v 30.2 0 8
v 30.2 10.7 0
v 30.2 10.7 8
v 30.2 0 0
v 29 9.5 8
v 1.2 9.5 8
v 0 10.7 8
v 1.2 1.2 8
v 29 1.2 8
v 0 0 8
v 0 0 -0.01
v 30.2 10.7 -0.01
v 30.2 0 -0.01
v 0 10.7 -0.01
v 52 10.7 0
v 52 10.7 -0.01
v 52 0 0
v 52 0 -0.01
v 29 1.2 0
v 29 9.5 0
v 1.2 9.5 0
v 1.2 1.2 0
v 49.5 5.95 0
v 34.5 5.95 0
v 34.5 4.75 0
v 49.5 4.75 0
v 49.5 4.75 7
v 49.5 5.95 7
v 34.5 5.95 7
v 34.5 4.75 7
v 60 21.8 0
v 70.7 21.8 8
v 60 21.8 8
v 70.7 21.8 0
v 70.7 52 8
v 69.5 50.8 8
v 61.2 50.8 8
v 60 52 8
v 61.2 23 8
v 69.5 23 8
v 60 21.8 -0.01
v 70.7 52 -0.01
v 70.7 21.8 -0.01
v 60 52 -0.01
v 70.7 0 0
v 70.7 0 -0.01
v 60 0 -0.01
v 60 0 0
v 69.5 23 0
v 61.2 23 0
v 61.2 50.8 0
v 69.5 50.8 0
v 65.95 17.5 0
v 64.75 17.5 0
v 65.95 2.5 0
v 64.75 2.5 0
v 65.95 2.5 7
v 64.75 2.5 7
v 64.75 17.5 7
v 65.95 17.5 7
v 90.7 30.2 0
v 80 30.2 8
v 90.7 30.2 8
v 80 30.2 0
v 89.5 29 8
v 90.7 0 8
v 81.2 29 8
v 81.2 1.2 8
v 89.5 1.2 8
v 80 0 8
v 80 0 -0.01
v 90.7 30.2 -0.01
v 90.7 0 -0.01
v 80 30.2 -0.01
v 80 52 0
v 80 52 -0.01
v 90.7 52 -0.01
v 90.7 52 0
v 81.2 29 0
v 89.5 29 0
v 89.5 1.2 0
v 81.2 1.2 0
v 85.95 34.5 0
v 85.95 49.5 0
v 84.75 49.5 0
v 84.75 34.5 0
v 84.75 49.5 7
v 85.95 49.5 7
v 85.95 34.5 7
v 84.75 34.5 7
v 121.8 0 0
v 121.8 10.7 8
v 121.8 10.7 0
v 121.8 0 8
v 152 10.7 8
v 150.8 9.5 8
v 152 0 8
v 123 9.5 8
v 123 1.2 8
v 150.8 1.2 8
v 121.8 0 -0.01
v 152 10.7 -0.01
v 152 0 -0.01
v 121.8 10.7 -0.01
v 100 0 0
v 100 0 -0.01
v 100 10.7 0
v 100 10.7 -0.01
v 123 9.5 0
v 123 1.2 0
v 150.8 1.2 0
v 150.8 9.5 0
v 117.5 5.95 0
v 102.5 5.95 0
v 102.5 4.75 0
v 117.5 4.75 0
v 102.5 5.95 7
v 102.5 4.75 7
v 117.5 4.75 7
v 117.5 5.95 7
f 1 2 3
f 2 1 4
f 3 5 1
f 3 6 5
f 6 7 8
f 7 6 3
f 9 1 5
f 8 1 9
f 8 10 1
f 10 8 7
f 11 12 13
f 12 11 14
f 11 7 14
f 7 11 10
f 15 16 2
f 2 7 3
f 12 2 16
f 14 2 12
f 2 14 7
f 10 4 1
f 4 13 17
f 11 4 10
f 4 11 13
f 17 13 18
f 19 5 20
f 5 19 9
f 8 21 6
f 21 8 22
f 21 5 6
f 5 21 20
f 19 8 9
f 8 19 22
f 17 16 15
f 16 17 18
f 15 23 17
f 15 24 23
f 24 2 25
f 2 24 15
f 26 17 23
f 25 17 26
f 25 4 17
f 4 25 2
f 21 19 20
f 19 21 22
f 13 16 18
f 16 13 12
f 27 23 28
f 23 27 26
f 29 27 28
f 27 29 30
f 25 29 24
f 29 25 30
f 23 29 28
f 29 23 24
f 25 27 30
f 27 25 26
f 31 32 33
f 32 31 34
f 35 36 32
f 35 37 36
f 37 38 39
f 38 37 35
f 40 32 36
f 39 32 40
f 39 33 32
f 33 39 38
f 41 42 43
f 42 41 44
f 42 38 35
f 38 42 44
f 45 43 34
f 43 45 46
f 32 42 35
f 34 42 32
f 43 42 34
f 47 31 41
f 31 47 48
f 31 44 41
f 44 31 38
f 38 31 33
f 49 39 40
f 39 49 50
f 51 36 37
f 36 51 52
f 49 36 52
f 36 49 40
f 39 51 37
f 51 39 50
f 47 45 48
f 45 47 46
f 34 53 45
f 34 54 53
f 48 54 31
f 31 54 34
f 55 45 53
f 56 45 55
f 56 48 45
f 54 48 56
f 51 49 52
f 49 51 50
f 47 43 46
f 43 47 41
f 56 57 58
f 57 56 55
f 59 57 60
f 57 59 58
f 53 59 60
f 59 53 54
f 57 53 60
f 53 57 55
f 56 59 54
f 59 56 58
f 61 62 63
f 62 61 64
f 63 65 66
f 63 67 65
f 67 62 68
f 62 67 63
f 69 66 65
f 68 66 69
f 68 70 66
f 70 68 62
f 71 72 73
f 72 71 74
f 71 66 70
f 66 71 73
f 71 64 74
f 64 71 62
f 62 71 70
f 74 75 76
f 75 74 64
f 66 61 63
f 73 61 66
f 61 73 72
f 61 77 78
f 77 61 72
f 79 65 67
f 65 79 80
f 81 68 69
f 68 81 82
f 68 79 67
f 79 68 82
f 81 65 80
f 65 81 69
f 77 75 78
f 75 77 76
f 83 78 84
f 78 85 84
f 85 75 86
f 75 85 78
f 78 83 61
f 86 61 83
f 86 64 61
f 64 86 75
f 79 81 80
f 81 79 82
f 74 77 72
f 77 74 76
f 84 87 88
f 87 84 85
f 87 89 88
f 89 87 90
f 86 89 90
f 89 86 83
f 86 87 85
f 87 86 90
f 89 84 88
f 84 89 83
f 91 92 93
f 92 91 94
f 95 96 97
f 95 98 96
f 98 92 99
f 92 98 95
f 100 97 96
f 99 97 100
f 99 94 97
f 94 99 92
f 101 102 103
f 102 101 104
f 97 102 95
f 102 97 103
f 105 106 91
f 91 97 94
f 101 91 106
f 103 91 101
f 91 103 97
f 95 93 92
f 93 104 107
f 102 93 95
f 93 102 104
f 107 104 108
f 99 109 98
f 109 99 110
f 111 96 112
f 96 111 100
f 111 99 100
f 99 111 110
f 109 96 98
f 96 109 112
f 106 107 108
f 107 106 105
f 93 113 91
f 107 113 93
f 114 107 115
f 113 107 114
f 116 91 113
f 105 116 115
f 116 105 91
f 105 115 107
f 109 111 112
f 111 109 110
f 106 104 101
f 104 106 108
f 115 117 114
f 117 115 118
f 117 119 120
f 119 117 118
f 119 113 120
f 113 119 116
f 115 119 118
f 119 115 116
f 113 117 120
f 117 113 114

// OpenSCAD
// file: ../../Base/Boxes.scad
// Fischertechnik Box Foundation
// Pre-designed Boxes

use <Constants.scad>

include <PlacementOptions.scad>

box190Width = 190;
box190Depth = 130;
box130Width = 130;
box130Depth = 95;
boxUsageHeight = 33.9;
boxWallThickness = 2.4;
boxBaseThickness = 1.0;
boxWebWidth = 3.0;

// getBoxWallThickness()
// Gets the wall thickness of a Fischertechnik Box

function getBoxWallThickness() = boxWallThickness;

// Gets the usable height of a fischertechnik box
function getBoxUsageHeight() = boxUsageHeight;

// Gets the thickness of the Fischertechnik box base.
function getBoxBaseThickness() = boxBaseThickness;

// Gets the width of a box web
function getBoxWebWidth() = boxWebWidth;

// Gets the usable inner space of a Box 190 as an x/y-list
function getBox190Space() = [
    box190Width - 2*getBoxWallThickness(), 
    box190Depth - 2*getBoxWallThickness() ];

// Imports the Fischertechnik empty box 130x190 mm and places it at position 0,0
// 190x130 are the outer sizes, the inner space is slightly smaller. Use getBox190Space() to get the inner sizes.
// This module needs the STL file "Fischertechnik Box 130x190.stl" in the library path.
// The box is positioned that the usable inner space is at the 0,0,0 position. The

module Box190() {
    translate([-getBoxWallThickness(),-getBoxWallThickness(),-getBoxBaseThickness()])
        import("Fischertechnik Box 130x190.stl", convexity=3);
}

// Gets the usable inner space of a Box 130 as an x/y-list
function getBox130Space() = [
    box130Width - 2*getBoxWallThickness(), 
    box130Depth - 2*getBoxWallThickness() ];

// Imports the Fischertechnik empty box 95x130 mm and places it at position 0,0
// 190x130 are the outer sizes, the inner space is slightly smaller. Use getBox190Space() to get the inner sizes.
// This module needs the STL file "Fischertechnik Box 95x130.stl" in the library path.
// The box is positioned that the usable inner space is at the 0,0,0 position. The

module Box130() {
    translate([-getBoxWallThickness(),-getBoxWallThickness(),-getBoxBaseThickness()])
        import("Fischertechnik Box 95x130.stl", convexity=3);
}

// Creates a web at the specified box walls
// corner 0 = LowerLeft, 1 = UpperLeft, 2 = UpperRight, 3 = LowerRight
// side 0 = LeftOfCorner, 1 = RightOfCorner
// distance = Distance in mm from the corner
// box = inner width and depth of the box (default: Box 190)
// webWidth = length of the web (default is 3 mms)
// webThickness = thickness of the web (default is 1 mm)

module BoxWeb(corner, side, distance, box=getBox190Space(), webWidth=getBoxWebWidth(), webThickness=1.0) {
    sink = getBoxWallThickness()/2;

    width = (corner % 2 == 0) ? 
            (side == LeftOfCorner ? webWidth : webThickness) :
            (side == LeftOfCorner ? webThickness : webWidth);

    depth = (corner % 2 == 0) ? 
            (side == RightOfCorner ? webWidth : webThickness) :
            (side == RightOfCorner ? webThickness : webWidth);
    
    xDiff = corner == LowerLeft ? 
                (side == LeftOfCorner ? -sink : distance) :
            (corner == UpperLeft ?                
                (side == LeftOfCorner ? distance : -sink) :
            (corner == UpperRight ?
                (side == LeftOfCorner ? box.x-webWidth+sink : box.x-distance-webThickness) :
                (side == LeftOfCorner ? box.x-distance-webThickness: box.x-webWidth+sink)));

    yDiff = corner == LowerLeft ? 
                (side == RightOfCorner ? -sink : distance) :
            (corner == UpperLeft ?
                (side == RightOfCorner ? box.y-distance : box.y-webWidth+sink) :
            (corner == UpperRight ?
                (side == RightOfCorner ? box.y-webWidth+sink : box.y-distance) :
                (side == RightOfCorner ? distance : -sink)));
    
    translate([xDiff, yDiff, -getExcess()])
        cube([width, depth, boxUsageHeight + 2*getExcess()]);
}
// file: ../../Base/Rotation.scad
// Fischertechnik Box Foundation
// Geometry Helpers Rotation

include <PlacementOptions.scad>

// getRotatedSpace(space, rotation=NoRotation)
// Rotates the space dependent on the specified rotation

function getRotatedSpace(space, rotation=NoRotation) = [
    (rotation == Rotate90 || rotation == Rotate270) ? space.y : space.x,
    (rotation == Rotate90 || rotation == Rotate270) ? space.x : space.y
];

// Rotates the given space around the fixed left lower corner
// space = the space the children needs as width/depth list [width,depth]
// rotation = 0 Rotate0 degrees, 1 Rotate90 degrees, 2 Rotate180 degrees, 3 Rotate270 degrees (equivalent to -90)

module RotateFix(space, rotation=NoRotation) {
    dy = (rotation == Rotate0 || rotation == Rotate270) ? 0 :
        (rotation == Rotate90) ? space.x :
        space.y;
    dx = (rotation < Rotate180) ? 0 :
        (rotation == Rotate180) ? space.x :
        space.y;
    
    translate([dx, dy, 0])
        rotate([0, 0, rotations[rotation]])
            children();
}
// file: ../../Base/Alignment.scad
// Fischertechnik Box Foundation
// Geometry Helpers Alignment

include <PlacementOptions.scad>

// getAlignedX(elementWidth, spaceWidth, align=AlignRight, offset=0)
// Gets the aligned X offset of an element with the given
// width in the given space.
// elementWidth = The width of the element to positon
// spaceWidth = The space where the element should be aligned
// align = 0 AlignLeft, 1 AlignCenter, 2 AlignRight
// offset = an optional offset from the aligned position. When
// aligned left or centered, then positive values are in X direction.
// When aligned right then positive values are in negative X direction.

function getAlignedX(elementWidth, spaceWidth, align=AlignRight, offset=0) =
    (align == AlignLeft) ?
        offset :
        ((align == AlignCenter) ?
        (spaceWidth - elementWidth)/2 + offset :
        spaceWidth - offset - elementWidth);

// getAlignedY(elementDepth, spaceDepth, align=AlignTop, offset=0)
// Gets the aligned Y offset of an element with the given
// depth in the given space.
// elementDepth = The depth of the element to positon
// spaceDepth = The space where the element should be aligned
// align = 0 AlignBottom, 1 AlignCenter, 2 AlignTop
// offset = an optional offset from the aligned position. When
// aligned bottom or centered, then positive values are in Y direction.
// When aligned top then positive values are in negative Y direction.

function getAlignedY(elementDepth, spaceDepth, align=AlignTop, offset=0) =
    (align == AlignBottom) ?
        offset :
        ((align == AlignCenter) ?
        (spaceDepth - elementDepth)/2 + offset :
        spaceDepth - offset - elementDepth);
// file: ../../Base/Constants.scad
// Fischertechnik Box Foundation
// Constants

// Constant values necessary for multiple elements

// Base constants
dividerThickness = 1.2;
excess = 0.01;
fragments = 90;
tolerance = 0.8;

// Gets the thickness of a divider 
function getDividerThickness() = dividerThickness;

// Gets the excess that is used to merge walls into each other
function getExcess() = excess;

// Gets amount of fragments of a cylinder
function getFragments() = fragments;

// Gets the inner tolerance of a frame to each side
function getTolerance() = tolerance;


// Fischertechnik specific constants
axisDiameter = 4;
axisBottomDiameter = axisDiameter + 1;
axisTolerance = 0.2;
axisLockingLength = 8;

// Gets axis diameter of Fischertechnik axis
function getAxisDiameter() = axisDiameter;

// Gets axis diameter tolerance (subtracted for element axis)
function getAxisTolerance() = axisTolerance;

// Gets the axis diameter for standing axis
function getStandAxisDiameter() = getAxisDiameter() - getAxisTolerance();

// Gets axis bottom diameter for thicker part at the bottom
function getAxisBottomDiameter() = axisBottomDiameter;

// Gets the lengthh of the locking part of a locking axis
function getAxisLockingLength() = axisLockingLength;

// Studs

studHeight = 2.5;
studTolerance = 0.2;
studRailDistance = 9;   // as in ft 50

// gets the height of a connecting stud
function getStudHeight() = studHeight;

// gets the connecting stud height tolerance
function getStudTolerance() = studTolerance;

// gets the default rail distance for studs
function getStudRailDistance() = studRailDistance;

// Dockable Frame with Edge

standardEdgeDistance = 2.5;
standardWebDistance = 11.5;
standardCornerLength = 15;

// gets the standard distance to the wall of the box for dockable frames with webs
function getStandardEdgeDistance() = standardEdgeDistance;

// gets the standard distance of each web to the corner of the dockable frame
function getStandardWebDistance() = standardWebDistance;

// gets the standard length of the corner walls of a dockable frame
function getStandardCornerLength() = standardCornerLength;

// Tubes

tubeWallFactor = 0.8;

// gets the wall thickness of a tube.
function getTubeWallThickness() = tubeWallFactor * getDividerThickness();

// Small Parts and Divider Frame

smallPartsFrameHeight = 20;

// gets the frame height for docked small parts boxes.
function getSmallPartsFrameHeight() = smallPartsFrameHeight;

// Hubs

hubRingDiameter = 19.5;
hubRingLevelDiameter = 21;

// gets the diameter of a tube matching the inner ring of a wheel
function getHubRingDiameter() = hubRingDiameter;

// gets the diameter of a hub tube with a thicker diameter
function getHubRingLevelDiameter() = hubRingLevelDiameter;

// Struts

strutAddLength = 9.0;
strutDepth = 8.0;
strutThickness = 2.8;
strutOuterTolerance = 0.6;

// gets the full length of a strut (nominal length plus 2x radius at the ends)
function getFullStrutLength(length) = length + strutAddLength;

// gets the radius of the end of a strut
function getStrutEndRadius() = strutAddLength / 2;

// gets the the depth (width) of a strut
function getStrutDepth() = strutDepth;

// gets the the thickness of a strut
function getStrutThickness() = strutThickness;

// gets the tolerance added to the strut sizes for strut holders
function getStrutOuterTolerance() = strutOuterTolerance;

// Propeller

propellerAxisDiameter = 7.0;
propellerAxisTolerance = 0.2;

// gets the propeller axis outer diameter
function getPropellerAxisDiameter() = propellerAxisDiameter;

// gets the propeller axis printing tolerance
function getPropellerAxisTolerance() = propellerAxisTolerance;
// file: ../../Base/PlacementOptions.scad
// Fischertechnik Box Foundation
// Placement Options

// Alignment
NoAlign = 0;
AlignLeft = 1;
AlignBottom = 2;
AlignCenter = 3;
AlignRight = 4;
AlignTop = 5;

// Element rotation degree steps
rotations = [0, -90, -180, -270];

// Rotation
NoRotation = 0;
Rotate0 = 0;
Rotate90 = 1;
Rotate180 = 2;
Rotate270 = 3;

// Docking (seen from above)
NoDock = -1;
DockLeft = 0;
DockTop = 1;
DockRight = 2;
DockCorner = 2;
DockBottom = 3;

// Web corners
LowerLeft = 0;
UpperLeft = 1;
UpperRight = 2;
LowerRight = 3;

// Web position relative to corner
LeftOfCorner = 0;
RightOfCorner = 1;
// file: ../../Elements/FrameBracketWithWorm.scad
// Fischertechnik Box Library
// Frame  for bracket with worm
// 31045

use <../Base/Constants.scad>
use <../ModelBase/Complex.scad>

// getFrameBracketWithWormSpace()
// Gets the space for a frame for a bracket with worm.

function getFrameBracketWithWormSpace() = getFrameBracketSpace();

// FrameBracketWithWorm()
// Frame for bracket with worm.

module FrameBracketWithWorm() {
    FrameBracket([ 15, getDividerThickness(), 7 ]);
}

// Test
color("lightgray")
FrameBracketWithWorm();
// file: ../../Base/Placement.scad
// Fischertechnik Box Foundation
// Geometry Helpers Placement

use <Constants.scad>
use <Alignment.scad>
use <Rotation.scad>
use <Boxes.scad>

include <PlacementOptions.scad>

// Place(x=0, y=0, elementSpace=[0,0], alignX=AlignLeft, alignY=AlignBottom, rotation=Rotate0, boxSpace=getBox190Space())
// Places the child at the specified position
// y = Y-Position. This is a relative position when an X aligment is specified.
// x = X-Position. This is a relative position when an Y aligment is specified.
// elementSpace = space of the element to be placed [x,y]
// alignX = -1=NoAlign, 0 AlignLeft, 1 AlignCenter, 3 AlignRight (elementSpace and boxSpace required!)
// alignY = -1=NoAlign, 2 AlignBottom, 1 AlignCenter, 4 AlignTop (elementSpace and boxSpace required!)
// rotation = 0 Rotate0 0 degrees, 1 Rotate90 90 degrees, 
// 2 Rotate180 180 degrees, 3 Rotate270 270 degrees (equivalent to -90)
// boxSpace = Inner space of the box where the placement occurs [x,y] - default is Box 190x130 inner space

module Place(x=0, y=0, elementSpace=[0,0], 
  alignX=AlignLeft, alignY=AlignBottom, 
  rotation=NoRotation, boxSpace=getBox190Space()) {

    module Position(x, y, space, rotation=Rotate0) {
        translate([x, y, 0])
            RotateFix(space, rotation)
                children();
    }

    space = getRotatedSpace(elementSpace, rotation);
    alignedX = getAlignedX(space.x, boxSpace.x, alignX, x);
    alignedY = getAlignedY(space.y, boxSpace.y, alignY, y);
    Position(alignedX, alignedY, elementSpace, rotation)
        children();
}

// Center(space=getBox130Space(), elementSpace=[0,0])
// space = Space where the children is centered. For cylinder use centered=true and no elementSpace.
// elementSpace = space of the element to be centered [x,y]

module Center(space=getBox190Space(), elementSpace=[0,0]) {
    translate([(space.x - elementSpace.x) / 2, (space.y - elementSpace.y) / 2])
        children(0);
}

// CenterHorizontal(width=0, y=0, offset=0, space=getBox130Space())
// space = Space where the children is centered. For cylinder use centered=true and no elementSpace.
// elementSpace = space of the element to be centered [x,y]

module CenterHorizontal(width=0, y=0, offset=0, space=getBox190Space()) {
    translate([(space.x - width) / 2 + offset, y])
        children(0);
}

// CenterVertical(depth=0, x=0, offset=0, space=getBox130Space())
// space = Space where the children is centered. For cylinder use centered=true and no elementSpace.
// elementSpace = space of the element to be centered [x,y]

module CenterVertical(depth=0, x=0, offset=0, space=getBox190Space()) {
    translate([x, (space.y - depth) / 2 + offset])
        children(0);
}
// main file
// Fischertechnik Box Foundation
// Elements
// Test FrameBracketWithWorm

use <../../Base/Placement.scad>
use <../../Elements/FrameBracketWithWorm.scad>

include <../../Base/PlacementOptions.scad>

FrameBracketWithWorm();

Place(60, 0, getFrameBracketWithWormSpace(), rotation=Rotate90)
    FrameBracketWithWorm();

Place(80, 0, getFrameBracketWithWormSpace(), rotation=Rotate270)
    FrameBracketWithWorm();

Place(100, 0, getFrameBracketWithWormSpace(), rotation=Rotate180)
    FrameBracketWithWorm();
